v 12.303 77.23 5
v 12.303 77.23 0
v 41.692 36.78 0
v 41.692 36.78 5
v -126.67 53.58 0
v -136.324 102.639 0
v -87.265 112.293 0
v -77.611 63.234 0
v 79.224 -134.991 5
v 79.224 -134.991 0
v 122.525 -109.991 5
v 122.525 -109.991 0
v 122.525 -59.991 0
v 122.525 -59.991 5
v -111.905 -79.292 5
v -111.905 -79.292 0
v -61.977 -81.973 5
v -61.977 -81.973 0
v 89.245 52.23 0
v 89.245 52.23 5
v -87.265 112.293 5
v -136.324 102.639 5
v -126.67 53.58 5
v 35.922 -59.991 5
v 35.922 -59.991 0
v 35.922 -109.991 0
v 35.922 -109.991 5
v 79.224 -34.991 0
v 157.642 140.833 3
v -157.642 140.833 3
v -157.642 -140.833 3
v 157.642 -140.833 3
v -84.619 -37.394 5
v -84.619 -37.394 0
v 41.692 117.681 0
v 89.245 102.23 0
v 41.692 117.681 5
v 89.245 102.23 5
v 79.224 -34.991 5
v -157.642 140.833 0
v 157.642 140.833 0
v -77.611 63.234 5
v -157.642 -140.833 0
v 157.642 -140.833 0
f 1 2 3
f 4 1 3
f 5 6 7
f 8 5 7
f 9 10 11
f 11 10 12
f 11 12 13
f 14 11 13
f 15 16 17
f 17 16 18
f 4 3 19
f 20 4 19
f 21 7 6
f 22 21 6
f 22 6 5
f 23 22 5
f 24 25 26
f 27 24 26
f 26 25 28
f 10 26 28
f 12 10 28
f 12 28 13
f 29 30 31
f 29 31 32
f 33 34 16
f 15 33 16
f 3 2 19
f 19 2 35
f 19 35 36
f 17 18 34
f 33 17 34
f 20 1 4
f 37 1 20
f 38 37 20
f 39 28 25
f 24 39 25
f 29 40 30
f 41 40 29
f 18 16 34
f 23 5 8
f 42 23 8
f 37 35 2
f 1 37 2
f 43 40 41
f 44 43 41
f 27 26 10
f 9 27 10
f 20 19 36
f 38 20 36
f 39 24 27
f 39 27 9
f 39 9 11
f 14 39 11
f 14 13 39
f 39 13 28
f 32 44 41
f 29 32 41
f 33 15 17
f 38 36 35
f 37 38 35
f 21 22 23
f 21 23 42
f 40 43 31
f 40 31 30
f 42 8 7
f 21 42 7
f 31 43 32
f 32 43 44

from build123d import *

# Parameters (mm, degrees)
F0_W     = 315.2838349342
F0_H     = 281.6659808159
F1_DEPTH = 3
F4_DEPTH = 5


with BuildPart() as f1:
    # F0 (on Top) → F1 (new body)
    with BuildSketch(Plane.XY):
        Rectangle(F0_W, F0_H)
    extrude(amount=F1_DEPTH)


with BuildPart() as f4:
    # F2 (on Top) → F4 (new body)
    with BuildSketch(Plane.XY):
        Polygon((-77.6110729951, 63.2337894617), (-87.264929372, 112.2929685932), (-136.3241085034, 102.6391122163), (-126.6702521266, 53.5799330849), align=None)
    extrude(amount=F4_DEPTH)


with BuildPart() as f4b:
    # F2 (on Top) → F4, piece 2 (new body)
    with BuildSketch(Plane.XY):
        Polygon((89.2451841273, 52.2303909983), (89.2451841273, 102.2303909983), (41.6923583126, 117.681240717), (12.303095698, 77.2303909983), (41.6923583126, 36.7795412795), align=None)
    extrude(amount=F4_DEPTH)


with BuildPart() as f4c:
    # F2 (on Top) → F4, piece 3 (new body)
    with BuildSketch(Plane.XY):
        Polygon((-61.9768510605, -81.9730617128), (-84.619029346, -37.3935623607), (-111.9049191302, -79.292013629), align=None)
    extrude(amount=F4_DEPTH)


with BuildPart() as f4d:
    # F2 (on Top) → F4, piece 4 (new body)
    with BuildSketch(Plane.XY):
        Polygon((122.5249998593, -109.9908813834), (122.5249998593, -59.9908813834), (79.22372967, -34.9908813834), (35.9224594808, -59.9908813834), (35.9224594808, -109.9908813834), (79.22372967, -134.9908813834), align=None)
    extrude(amount=F4_DEPTH)


solid = Compound([f1.part, f4.part, f4b.part, f4c.part, f4d.part])
